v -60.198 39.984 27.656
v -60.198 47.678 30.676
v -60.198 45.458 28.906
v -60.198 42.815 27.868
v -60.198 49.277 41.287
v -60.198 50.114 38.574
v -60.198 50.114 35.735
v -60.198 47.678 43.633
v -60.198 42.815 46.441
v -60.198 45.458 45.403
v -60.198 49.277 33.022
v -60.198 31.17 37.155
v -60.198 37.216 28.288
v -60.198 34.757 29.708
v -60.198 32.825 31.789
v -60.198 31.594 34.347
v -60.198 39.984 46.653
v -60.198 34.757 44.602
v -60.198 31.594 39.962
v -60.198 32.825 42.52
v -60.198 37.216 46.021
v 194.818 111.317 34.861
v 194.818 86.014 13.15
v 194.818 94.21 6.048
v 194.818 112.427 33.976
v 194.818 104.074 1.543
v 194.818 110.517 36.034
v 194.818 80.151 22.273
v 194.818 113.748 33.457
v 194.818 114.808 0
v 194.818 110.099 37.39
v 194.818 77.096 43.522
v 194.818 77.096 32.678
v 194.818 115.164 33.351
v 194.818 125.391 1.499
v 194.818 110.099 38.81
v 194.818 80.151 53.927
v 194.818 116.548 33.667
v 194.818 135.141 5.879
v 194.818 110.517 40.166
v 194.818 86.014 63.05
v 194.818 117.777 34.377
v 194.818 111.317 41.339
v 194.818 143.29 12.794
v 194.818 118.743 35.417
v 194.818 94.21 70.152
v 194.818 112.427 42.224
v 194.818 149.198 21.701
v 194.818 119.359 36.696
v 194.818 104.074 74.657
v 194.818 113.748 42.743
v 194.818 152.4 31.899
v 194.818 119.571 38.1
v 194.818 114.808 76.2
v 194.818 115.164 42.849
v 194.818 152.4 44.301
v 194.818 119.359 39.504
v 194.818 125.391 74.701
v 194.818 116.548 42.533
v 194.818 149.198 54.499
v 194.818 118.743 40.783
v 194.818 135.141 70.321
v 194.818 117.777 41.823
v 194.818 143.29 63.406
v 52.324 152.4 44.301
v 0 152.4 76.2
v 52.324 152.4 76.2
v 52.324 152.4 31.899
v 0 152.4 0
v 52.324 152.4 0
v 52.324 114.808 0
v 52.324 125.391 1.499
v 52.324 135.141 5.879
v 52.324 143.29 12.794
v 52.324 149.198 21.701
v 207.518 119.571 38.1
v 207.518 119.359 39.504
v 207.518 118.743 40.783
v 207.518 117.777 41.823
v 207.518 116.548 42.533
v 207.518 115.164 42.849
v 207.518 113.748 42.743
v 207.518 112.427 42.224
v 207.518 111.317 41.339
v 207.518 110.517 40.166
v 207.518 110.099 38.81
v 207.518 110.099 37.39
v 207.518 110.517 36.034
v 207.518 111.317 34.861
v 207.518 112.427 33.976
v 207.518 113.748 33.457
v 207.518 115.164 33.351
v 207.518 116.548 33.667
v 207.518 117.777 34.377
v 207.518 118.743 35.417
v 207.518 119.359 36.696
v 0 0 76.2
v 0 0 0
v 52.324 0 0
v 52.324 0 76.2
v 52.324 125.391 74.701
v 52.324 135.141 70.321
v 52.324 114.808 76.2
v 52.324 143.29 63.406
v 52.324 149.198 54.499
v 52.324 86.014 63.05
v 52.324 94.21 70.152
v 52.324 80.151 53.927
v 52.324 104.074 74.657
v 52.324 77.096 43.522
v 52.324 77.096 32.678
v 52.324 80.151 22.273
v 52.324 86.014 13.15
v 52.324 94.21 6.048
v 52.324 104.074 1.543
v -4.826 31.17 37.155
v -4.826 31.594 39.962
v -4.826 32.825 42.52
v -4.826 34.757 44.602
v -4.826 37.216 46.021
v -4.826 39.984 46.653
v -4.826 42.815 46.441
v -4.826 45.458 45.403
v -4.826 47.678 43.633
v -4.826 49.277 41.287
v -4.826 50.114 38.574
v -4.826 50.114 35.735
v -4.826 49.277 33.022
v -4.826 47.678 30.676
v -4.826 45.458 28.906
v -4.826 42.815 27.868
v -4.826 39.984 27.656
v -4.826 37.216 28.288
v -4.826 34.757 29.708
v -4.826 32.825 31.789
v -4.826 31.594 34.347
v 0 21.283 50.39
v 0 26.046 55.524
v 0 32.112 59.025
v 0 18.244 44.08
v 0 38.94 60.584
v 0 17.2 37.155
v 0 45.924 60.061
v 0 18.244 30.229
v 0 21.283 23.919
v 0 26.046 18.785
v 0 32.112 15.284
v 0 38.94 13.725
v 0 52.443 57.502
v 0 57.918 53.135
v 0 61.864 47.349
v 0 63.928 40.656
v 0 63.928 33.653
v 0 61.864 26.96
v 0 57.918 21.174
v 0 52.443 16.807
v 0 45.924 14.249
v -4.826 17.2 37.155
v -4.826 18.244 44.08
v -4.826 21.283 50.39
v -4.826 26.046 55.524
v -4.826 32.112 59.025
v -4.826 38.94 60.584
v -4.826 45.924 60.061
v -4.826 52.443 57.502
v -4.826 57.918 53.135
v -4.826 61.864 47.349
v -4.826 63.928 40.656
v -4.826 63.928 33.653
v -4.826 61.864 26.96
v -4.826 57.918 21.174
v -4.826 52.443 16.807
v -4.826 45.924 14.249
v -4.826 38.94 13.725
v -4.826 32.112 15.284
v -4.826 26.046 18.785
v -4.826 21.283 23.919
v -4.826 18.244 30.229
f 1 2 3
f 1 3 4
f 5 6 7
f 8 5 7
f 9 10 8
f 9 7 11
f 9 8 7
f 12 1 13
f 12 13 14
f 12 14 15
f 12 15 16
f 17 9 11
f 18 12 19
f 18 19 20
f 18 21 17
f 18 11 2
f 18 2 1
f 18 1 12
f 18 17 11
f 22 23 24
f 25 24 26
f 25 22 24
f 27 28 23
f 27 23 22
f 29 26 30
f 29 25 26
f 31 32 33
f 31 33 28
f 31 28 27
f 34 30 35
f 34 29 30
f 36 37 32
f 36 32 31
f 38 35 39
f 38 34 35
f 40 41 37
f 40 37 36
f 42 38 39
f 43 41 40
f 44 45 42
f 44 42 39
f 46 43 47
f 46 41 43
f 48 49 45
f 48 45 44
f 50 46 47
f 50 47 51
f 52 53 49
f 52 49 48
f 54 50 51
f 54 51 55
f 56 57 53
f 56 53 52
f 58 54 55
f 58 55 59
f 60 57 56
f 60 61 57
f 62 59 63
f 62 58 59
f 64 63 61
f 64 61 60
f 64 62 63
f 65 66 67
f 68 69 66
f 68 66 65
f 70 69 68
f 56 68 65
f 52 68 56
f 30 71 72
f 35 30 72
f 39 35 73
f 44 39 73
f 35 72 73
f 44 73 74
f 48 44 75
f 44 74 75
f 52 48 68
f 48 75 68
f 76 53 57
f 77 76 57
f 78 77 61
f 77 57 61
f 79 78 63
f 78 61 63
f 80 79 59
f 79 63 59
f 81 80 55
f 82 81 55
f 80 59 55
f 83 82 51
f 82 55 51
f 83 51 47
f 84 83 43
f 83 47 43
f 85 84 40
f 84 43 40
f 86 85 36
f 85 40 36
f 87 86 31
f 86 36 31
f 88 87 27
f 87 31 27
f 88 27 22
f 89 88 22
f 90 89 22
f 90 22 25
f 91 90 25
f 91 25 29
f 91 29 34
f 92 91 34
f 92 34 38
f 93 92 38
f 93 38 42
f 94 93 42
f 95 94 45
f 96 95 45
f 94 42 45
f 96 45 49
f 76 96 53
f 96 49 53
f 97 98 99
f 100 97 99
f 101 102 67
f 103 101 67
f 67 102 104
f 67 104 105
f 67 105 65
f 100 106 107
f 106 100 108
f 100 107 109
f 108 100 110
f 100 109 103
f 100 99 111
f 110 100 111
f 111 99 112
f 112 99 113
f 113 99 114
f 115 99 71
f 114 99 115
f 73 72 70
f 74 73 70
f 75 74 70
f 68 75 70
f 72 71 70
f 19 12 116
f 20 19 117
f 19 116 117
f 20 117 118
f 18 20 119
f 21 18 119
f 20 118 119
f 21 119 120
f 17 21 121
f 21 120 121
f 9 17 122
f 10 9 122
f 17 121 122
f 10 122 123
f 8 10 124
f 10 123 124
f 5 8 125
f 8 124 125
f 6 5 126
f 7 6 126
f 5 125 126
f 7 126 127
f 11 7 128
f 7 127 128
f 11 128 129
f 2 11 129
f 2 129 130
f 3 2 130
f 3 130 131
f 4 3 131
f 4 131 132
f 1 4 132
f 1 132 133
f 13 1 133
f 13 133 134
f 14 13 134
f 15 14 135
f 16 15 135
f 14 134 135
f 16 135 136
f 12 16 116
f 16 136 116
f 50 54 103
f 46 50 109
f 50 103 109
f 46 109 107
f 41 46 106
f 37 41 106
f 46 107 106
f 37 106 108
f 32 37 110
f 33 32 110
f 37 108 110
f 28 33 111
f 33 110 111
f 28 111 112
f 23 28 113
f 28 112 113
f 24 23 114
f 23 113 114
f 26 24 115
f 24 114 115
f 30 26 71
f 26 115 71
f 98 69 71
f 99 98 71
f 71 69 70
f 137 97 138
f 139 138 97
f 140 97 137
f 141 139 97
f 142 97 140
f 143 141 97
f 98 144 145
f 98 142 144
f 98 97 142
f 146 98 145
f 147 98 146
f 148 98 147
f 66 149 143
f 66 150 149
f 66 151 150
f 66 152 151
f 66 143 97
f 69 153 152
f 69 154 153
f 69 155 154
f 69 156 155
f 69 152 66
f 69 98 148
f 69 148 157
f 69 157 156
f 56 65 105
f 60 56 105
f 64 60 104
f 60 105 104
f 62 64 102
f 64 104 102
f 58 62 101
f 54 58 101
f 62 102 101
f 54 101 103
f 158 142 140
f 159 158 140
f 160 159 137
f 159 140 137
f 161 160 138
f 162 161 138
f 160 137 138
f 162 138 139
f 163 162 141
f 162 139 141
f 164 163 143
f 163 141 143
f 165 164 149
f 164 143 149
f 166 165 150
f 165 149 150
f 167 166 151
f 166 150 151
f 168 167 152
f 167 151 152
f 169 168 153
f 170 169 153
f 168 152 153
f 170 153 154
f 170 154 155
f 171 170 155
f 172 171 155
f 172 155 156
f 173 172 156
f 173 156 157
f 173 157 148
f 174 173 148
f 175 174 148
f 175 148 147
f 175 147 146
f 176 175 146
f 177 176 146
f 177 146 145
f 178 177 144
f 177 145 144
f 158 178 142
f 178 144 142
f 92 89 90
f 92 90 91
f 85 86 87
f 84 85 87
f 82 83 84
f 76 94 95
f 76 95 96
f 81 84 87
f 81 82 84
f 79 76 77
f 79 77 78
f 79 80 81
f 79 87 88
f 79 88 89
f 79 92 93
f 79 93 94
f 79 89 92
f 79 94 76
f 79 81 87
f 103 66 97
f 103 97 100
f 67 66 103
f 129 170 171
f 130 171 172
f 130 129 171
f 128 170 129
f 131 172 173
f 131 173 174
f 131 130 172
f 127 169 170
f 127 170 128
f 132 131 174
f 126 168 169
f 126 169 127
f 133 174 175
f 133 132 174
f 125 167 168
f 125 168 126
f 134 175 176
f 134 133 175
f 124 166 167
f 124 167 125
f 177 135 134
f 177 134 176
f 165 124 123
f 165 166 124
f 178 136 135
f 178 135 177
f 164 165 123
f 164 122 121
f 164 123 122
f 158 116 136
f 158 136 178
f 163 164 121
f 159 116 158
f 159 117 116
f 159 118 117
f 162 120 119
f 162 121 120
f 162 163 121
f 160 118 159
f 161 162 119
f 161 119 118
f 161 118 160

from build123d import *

# Parameters (mm, degrees)
F0_W     = 52.324
F0_H     = 152.4
F1_DEPTH = 76.2
F3_DEPTH = 142.494
F4_R     = 23.495
F5_DEPTH = 4.826
F6_R     = 9.525
F7_DEPTH = 55.372
F8_R     = 4.7625
F9_DEPTH = 12.7


with BuildPart() as f1:
    # F0 (on Top) → F1 (new body)
    with BuildSketch(Plane.XY):
        with Locations((26.162, 76.2)):
            Rectangle(F0_W, F0_H)
    extrude(amount=F1_DEPTH)

    # F2 (on face) → F3 (join)
    with BuildSketch(Plane.YZ.offset(52.324)):
        with BuildLine():
            Line((152.4, 31.89907), (152.4, 44.30093))
            ThreePointArc((152.4, 44.30093), (139.459111, 67.15052), (114.808, 76.2))
            ThreePointArc((114.808, 76.2), (76.708, 38.1), (114.808, 0))
            ThreePointArc((114.808, 0), (139.459111, 9.04948), (152.4, 31.89907))
        make_face()
    extrude(amount=F3_DEPTH)

    # F4 (on face) → F5 (join)
    with BuildSketch(Plane(origin=(0, 0, 0), x_dir=(0, -1, 0), z_dir=(-1, 0, 0))):
        with Locations((-40.695388, 37.154574)):
            Circle(F4_R)
    extrude(amount=F5_DEPTH)

    # F6 (on face) → F7 (join)
    with BuildSketch(Plane(origin=(-4.826, 0, 0), x_dir=(0, -1, 0), z_dir=(-1, 0, 0))):
        with Locations((-40.695388, 37.154574)):
            Circle(F6_R)
    extrude(amount=F7_DEPTH)

    # F8 (on face) → F9 (join)
    with BuildSketch(Plane.YZ.offset(194.818)):
        with Locations((114.808, 38.1)):
            Circle(F8_R)
    extrude(amount=F9_DEPTH)


solid = f1.part
